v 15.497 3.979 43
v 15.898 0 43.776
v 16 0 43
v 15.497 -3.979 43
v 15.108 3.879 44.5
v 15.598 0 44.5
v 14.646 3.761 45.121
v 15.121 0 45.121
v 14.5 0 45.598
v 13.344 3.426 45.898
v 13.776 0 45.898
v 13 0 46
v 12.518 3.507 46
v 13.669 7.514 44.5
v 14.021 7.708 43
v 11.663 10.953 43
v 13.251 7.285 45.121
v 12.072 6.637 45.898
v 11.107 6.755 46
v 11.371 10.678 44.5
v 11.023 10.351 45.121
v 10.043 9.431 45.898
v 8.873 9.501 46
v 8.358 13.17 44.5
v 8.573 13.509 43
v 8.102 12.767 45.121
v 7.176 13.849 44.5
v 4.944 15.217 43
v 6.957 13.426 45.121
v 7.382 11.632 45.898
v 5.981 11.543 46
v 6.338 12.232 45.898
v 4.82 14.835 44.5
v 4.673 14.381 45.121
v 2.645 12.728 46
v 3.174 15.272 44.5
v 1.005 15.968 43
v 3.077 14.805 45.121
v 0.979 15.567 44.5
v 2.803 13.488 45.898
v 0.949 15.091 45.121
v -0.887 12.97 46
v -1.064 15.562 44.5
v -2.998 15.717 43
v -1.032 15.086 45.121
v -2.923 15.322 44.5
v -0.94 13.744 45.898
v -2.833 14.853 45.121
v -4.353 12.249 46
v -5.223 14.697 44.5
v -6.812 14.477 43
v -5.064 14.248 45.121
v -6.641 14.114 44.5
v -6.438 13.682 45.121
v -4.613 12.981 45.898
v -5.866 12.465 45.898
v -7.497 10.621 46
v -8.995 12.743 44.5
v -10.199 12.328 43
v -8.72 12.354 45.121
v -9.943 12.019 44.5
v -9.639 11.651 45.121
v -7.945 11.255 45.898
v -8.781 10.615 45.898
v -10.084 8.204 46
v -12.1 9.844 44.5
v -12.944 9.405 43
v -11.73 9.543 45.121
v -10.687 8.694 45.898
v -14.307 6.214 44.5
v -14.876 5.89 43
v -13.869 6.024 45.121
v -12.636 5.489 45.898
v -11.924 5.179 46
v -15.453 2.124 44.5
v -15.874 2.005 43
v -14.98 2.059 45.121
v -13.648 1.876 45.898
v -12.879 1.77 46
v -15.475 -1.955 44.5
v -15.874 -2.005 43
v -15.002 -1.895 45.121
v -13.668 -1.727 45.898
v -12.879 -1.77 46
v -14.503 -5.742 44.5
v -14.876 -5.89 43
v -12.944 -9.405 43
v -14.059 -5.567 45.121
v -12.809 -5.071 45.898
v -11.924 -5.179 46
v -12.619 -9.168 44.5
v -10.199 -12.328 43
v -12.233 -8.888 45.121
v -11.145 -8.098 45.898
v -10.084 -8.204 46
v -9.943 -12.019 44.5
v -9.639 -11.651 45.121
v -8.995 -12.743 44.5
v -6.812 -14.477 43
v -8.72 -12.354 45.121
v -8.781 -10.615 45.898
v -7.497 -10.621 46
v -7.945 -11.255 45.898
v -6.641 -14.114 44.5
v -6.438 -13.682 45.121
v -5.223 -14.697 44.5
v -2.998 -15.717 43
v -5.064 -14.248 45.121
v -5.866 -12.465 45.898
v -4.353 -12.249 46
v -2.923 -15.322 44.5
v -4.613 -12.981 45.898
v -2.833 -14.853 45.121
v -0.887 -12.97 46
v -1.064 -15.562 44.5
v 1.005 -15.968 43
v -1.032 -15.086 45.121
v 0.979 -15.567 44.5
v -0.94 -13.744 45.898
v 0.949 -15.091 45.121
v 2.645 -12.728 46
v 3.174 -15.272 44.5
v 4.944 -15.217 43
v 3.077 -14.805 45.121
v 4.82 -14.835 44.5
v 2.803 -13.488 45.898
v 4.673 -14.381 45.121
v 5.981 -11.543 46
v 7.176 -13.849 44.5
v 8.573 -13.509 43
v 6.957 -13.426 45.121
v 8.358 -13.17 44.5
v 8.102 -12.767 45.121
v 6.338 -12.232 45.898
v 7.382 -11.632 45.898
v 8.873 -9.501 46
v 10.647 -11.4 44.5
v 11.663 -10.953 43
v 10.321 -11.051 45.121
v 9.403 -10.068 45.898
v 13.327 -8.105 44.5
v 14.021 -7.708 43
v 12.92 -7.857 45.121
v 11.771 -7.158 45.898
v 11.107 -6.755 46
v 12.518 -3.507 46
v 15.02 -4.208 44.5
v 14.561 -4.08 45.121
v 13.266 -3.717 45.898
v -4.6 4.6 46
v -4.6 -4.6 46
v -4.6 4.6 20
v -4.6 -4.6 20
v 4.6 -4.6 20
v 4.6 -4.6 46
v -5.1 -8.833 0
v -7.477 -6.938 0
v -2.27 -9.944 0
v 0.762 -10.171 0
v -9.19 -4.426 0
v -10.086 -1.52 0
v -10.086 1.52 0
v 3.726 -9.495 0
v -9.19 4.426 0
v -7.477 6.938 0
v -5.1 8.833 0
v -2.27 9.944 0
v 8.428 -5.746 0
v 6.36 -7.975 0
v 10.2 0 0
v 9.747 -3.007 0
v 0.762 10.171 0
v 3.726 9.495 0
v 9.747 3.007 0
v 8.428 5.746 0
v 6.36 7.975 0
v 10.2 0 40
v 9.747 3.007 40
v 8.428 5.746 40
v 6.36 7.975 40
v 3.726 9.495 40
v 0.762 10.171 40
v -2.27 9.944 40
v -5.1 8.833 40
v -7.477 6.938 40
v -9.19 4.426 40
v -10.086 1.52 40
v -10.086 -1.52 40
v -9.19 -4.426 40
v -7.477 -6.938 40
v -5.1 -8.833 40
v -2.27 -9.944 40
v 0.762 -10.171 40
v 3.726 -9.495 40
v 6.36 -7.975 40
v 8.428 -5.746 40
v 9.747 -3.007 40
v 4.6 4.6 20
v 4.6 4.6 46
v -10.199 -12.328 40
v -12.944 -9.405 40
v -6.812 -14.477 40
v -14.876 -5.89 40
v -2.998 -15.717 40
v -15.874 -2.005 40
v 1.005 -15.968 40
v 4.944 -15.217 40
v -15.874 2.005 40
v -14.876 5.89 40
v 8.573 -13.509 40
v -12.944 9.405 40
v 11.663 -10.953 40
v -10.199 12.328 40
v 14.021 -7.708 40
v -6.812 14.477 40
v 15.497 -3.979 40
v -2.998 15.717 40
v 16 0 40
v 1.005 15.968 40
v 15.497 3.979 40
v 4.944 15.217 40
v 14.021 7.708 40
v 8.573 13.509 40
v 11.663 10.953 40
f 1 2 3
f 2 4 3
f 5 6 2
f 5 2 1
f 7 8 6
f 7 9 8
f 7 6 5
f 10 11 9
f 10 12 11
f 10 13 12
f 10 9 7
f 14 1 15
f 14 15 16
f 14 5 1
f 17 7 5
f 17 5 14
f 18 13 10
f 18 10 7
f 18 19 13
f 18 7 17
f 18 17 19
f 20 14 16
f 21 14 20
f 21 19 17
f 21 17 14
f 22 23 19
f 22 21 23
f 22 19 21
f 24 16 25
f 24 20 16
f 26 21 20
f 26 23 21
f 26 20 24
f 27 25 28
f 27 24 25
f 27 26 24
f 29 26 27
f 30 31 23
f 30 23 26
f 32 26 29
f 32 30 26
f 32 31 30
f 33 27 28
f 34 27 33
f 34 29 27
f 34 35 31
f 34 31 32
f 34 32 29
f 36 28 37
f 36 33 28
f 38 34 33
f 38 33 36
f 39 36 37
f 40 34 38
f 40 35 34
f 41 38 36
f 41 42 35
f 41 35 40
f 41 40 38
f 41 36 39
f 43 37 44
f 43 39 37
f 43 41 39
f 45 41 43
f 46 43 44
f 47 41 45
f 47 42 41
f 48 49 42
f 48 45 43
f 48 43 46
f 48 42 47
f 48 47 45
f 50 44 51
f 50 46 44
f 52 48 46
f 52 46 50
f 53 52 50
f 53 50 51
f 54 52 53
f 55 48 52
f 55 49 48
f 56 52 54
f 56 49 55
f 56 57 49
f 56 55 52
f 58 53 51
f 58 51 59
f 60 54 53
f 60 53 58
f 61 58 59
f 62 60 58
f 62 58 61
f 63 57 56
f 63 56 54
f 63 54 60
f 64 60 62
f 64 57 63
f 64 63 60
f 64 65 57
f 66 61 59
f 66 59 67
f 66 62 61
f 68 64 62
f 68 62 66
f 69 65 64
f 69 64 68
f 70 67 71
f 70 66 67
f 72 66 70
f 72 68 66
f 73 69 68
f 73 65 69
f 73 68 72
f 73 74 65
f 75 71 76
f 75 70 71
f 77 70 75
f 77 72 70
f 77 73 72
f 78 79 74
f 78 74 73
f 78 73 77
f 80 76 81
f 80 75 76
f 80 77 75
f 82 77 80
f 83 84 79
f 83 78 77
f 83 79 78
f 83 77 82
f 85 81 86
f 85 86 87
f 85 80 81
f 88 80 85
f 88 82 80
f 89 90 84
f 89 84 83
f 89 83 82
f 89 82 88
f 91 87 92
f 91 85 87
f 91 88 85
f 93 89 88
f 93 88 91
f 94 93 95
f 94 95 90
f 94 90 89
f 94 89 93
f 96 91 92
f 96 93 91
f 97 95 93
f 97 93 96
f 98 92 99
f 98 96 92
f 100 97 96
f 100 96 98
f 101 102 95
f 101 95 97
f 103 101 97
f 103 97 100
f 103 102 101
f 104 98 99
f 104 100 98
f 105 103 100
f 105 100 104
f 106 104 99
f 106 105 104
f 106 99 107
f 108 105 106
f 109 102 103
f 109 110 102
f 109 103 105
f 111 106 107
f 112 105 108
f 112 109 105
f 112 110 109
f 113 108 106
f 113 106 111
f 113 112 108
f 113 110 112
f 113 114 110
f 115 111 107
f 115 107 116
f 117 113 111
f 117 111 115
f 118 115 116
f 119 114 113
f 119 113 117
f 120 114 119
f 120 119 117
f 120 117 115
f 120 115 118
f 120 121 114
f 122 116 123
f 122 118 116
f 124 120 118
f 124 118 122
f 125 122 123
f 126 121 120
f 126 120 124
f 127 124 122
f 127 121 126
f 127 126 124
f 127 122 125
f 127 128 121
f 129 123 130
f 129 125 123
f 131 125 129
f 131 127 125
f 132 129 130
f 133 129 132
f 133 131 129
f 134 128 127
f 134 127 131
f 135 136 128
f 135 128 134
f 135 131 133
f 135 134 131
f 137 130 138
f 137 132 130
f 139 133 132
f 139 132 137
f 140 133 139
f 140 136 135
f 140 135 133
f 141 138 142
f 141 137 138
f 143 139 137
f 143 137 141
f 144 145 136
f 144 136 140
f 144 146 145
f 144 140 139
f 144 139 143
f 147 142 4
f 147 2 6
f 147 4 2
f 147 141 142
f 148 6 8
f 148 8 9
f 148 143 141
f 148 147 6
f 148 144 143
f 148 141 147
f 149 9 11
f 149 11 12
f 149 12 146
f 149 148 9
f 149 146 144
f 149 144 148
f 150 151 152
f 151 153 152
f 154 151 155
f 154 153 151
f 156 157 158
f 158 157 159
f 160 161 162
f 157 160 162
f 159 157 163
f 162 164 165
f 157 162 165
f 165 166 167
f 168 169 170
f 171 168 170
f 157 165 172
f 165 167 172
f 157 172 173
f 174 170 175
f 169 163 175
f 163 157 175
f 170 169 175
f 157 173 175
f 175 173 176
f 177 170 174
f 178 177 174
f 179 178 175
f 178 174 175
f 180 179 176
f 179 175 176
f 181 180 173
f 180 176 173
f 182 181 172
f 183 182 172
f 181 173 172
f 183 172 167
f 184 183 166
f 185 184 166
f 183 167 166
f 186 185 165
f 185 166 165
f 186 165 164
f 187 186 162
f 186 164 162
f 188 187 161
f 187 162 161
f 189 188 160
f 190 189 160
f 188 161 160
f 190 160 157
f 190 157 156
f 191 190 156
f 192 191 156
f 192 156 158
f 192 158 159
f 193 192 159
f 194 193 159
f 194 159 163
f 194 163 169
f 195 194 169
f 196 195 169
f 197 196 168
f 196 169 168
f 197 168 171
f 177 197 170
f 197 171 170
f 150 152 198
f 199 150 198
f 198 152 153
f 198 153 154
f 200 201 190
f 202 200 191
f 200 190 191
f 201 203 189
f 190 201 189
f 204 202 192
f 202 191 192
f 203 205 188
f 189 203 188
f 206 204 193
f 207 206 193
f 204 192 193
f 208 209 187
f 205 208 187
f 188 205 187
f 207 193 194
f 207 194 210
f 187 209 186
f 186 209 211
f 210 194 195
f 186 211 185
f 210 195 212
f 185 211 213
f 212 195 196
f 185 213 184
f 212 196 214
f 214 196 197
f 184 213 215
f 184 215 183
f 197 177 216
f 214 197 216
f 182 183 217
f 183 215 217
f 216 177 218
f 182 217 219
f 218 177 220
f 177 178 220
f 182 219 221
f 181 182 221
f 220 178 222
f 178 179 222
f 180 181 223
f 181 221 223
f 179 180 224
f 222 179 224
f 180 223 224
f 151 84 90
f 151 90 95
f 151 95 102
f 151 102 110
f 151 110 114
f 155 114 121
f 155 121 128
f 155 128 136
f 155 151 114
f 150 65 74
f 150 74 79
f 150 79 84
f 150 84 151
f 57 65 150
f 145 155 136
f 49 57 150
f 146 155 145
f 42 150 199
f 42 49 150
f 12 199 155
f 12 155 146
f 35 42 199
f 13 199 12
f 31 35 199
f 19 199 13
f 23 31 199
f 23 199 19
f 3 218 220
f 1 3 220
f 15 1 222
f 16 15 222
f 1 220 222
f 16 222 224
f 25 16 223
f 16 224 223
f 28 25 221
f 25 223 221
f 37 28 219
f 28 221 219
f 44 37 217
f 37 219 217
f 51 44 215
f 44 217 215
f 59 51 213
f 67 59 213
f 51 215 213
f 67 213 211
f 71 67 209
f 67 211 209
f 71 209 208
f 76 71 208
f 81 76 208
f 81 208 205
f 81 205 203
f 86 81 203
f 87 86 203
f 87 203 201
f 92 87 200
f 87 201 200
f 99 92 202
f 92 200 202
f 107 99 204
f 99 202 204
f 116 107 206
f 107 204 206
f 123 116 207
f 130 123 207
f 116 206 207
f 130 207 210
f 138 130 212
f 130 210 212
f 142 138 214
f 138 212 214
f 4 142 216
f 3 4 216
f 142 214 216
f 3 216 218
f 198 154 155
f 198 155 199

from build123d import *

# Parameters (mm, degrees)
F0_R     = 10.2
F1_DEPTH = 40
F2_W     = 9.2
F2_H     = 9.2
F3_DEPTH = 20
F4_R     = 16
F4_R_2   = 10.2
F4_W     = 9.2
F4_H     = 9.2
F5_DEPTH = 6
F6_R     = 3


with BuildPart() as f1:
    # F0 (on Top) → F1 (new body)
    with BuildSketch(Plane.XY):
        Circle(F0_R)
    extrude(amount=F1_DEPTH)

    # F2 (on face) → F3 (cut)
    with BuildSketch(Plane.XY.offset(40)):
        Rectangle(F2_W, F2_H)
    extrude(amount=-F3_DEPTH, mode=Mode.SUBTRACT)

    # F4 (on face) → F5 (join)
    with BuildSketch(Plane.XY.offset(40)):
        Circle(F4_R)
        Circle(F4_R_2, mode=Mode.SUBTRACT)
        Circle(F4_R_2)
        Rectangle(F4_W, F4_H, mode=Mode.SUBTRACT)
    extrude(amount=F5_DEPTH)

    # F6
    f6_edges = [f1.edges().sort_by_distance(p)[0] for p in [
        (-16, 0, 46),
    ]]
    fillet(f6_edges, radius=F6_R)


solid = f1.part
